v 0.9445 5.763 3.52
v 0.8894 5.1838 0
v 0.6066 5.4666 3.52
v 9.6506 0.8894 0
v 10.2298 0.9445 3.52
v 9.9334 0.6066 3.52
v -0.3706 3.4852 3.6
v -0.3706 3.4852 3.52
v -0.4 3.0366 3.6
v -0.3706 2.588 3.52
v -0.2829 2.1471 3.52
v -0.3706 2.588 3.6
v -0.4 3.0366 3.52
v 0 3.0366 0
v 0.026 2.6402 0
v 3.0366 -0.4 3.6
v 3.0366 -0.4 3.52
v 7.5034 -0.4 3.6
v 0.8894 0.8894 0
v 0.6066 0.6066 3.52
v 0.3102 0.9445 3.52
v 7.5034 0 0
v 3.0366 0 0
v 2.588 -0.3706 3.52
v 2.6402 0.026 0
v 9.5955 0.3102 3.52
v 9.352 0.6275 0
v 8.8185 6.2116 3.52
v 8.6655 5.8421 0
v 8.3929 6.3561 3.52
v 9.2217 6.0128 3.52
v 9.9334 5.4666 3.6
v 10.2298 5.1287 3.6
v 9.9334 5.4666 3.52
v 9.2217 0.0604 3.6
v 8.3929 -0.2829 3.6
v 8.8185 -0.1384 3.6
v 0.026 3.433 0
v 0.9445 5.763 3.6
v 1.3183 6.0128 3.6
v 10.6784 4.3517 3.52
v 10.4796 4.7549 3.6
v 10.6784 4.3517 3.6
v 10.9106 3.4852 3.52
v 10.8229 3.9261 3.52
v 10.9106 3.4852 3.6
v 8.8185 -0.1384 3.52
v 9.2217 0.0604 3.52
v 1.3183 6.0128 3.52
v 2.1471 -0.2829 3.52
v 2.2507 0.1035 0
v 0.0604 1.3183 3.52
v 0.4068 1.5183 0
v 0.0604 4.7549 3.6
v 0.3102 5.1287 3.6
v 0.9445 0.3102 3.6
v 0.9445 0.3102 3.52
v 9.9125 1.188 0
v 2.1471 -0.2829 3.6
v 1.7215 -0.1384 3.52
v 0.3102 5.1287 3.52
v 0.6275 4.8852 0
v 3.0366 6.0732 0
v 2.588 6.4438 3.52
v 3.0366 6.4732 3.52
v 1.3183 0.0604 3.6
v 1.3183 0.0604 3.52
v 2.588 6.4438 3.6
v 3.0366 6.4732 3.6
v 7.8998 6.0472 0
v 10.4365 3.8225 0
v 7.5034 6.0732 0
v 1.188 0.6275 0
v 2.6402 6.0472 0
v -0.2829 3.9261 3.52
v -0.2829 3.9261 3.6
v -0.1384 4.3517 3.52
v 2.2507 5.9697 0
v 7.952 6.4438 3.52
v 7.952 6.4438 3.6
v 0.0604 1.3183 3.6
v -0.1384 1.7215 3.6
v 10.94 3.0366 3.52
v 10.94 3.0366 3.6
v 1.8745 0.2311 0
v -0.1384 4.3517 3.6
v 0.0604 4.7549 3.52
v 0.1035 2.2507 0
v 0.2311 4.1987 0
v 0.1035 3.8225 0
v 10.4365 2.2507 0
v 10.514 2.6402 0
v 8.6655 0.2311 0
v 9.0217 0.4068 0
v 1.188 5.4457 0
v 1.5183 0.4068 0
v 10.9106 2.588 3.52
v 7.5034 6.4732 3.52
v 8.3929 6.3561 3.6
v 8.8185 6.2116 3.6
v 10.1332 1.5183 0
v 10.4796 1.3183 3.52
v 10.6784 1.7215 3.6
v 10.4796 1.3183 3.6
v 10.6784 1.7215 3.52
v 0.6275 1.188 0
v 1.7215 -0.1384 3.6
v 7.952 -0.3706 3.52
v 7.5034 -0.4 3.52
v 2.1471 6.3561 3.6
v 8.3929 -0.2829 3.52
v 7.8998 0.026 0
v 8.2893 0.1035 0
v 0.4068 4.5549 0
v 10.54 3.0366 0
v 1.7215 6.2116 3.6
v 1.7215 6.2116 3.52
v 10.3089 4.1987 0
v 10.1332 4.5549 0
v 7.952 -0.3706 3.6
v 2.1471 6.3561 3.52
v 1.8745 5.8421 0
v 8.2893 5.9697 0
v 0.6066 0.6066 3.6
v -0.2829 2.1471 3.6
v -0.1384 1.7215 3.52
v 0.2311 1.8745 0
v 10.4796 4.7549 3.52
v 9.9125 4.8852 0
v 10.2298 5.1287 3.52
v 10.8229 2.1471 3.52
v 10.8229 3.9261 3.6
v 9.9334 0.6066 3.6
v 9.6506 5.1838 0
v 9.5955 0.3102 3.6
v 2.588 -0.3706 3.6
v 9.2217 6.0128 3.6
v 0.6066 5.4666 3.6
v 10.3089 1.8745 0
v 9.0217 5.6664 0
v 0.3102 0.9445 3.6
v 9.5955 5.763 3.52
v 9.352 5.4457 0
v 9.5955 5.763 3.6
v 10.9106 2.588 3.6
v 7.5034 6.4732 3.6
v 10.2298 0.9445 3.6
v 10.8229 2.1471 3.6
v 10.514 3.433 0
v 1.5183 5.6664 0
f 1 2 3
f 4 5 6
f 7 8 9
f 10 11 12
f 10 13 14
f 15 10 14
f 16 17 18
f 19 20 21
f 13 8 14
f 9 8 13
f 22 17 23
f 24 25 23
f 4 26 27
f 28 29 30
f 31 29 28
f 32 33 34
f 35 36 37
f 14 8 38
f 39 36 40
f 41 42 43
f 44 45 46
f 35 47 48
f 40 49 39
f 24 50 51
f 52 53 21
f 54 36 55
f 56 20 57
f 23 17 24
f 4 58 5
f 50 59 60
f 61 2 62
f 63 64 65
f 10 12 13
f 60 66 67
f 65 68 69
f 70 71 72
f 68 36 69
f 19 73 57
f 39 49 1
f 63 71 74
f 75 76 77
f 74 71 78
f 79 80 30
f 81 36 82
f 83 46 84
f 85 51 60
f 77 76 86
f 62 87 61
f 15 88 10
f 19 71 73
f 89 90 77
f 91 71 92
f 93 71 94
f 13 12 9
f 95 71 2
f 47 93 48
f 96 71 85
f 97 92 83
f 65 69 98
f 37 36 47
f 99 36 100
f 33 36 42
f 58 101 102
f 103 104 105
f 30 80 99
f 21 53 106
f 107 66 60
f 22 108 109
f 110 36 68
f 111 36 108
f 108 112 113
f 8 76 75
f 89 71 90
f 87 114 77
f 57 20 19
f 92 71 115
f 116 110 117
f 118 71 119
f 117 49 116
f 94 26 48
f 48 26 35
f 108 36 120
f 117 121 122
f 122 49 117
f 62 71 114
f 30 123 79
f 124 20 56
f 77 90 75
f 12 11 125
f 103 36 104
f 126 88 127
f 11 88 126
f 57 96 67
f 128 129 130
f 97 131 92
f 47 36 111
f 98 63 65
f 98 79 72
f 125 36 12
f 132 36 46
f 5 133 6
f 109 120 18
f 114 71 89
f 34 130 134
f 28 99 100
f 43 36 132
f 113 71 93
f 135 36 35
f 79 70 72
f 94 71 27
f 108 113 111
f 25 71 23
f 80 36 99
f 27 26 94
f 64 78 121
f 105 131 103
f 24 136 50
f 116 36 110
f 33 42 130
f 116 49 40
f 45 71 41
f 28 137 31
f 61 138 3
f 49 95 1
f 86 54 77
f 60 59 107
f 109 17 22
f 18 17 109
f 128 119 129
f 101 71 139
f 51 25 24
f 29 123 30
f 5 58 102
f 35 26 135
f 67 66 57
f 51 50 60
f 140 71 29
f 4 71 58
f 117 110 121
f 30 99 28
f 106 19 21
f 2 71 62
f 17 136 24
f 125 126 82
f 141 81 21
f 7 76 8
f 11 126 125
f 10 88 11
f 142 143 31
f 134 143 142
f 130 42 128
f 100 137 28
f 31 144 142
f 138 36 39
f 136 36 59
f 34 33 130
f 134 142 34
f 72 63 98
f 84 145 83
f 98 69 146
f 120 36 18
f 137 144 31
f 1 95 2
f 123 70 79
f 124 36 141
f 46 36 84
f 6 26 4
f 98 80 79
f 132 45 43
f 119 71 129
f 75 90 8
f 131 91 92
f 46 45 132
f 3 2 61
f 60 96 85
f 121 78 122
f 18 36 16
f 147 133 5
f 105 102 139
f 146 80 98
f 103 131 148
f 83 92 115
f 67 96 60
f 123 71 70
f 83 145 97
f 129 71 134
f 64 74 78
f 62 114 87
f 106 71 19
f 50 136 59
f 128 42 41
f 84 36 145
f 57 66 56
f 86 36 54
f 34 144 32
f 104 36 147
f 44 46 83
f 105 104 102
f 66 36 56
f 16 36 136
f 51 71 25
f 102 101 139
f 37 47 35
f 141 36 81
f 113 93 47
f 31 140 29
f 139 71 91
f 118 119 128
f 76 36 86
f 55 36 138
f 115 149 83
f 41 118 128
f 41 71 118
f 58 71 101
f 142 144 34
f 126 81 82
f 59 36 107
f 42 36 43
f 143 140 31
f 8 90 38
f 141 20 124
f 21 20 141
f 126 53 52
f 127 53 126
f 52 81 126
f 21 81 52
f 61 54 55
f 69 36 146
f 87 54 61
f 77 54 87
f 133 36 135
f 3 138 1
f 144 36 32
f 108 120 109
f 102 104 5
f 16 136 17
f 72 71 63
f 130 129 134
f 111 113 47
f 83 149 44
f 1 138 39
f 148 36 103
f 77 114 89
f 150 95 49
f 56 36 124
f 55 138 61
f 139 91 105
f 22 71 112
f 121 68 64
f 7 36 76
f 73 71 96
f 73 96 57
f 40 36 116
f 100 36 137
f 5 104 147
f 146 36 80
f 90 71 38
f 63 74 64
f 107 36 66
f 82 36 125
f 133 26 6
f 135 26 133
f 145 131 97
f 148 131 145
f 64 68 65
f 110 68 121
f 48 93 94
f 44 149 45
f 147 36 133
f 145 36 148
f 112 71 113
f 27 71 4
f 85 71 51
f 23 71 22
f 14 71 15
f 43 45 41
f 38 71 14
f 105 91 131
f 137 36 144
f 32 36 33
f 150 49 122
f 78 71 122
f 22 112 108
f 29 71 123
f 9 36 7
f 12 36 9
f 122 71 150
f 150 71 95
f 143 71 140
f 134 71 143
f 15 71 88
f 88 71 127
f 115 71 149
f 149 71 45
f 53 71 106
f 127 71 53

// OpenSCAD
// file: dims.scad
// =============================================================================
// PLACEHOLDER dimensions — Option 1 replace-face stack
// =============================================================================
// ESTIMATED millimetres from refs/flat/DIMENSIONS.md (170 × 72.3, 2.35:1).
// Callipers are UNKNOWN. Every critical size is a guess until the OEM face
// and cluster bay are measured. This is NOT a verified AP1 drop-in.
//
// Origin (OpenSCAD): bottom-left of the module bounding box, Z toward driver.
// DIMENSIONS.md / pygame use top-left percentages — convert with y_from_top().
// =============================================================================

$fn = 48;
eps = 0.08;

// --- locked flat elevation (ESTIMATED mm from DIMENSIONS.md) ----------------
face_w = 170.0;             // ESTIMATED — TODO measure OEM face width
face_h = 72.3;              // ESTIMATED — 170 / 2.35; TODO measure height
face_aspect = 2.35;         // lock; do not invent a new family

step_w_pct = 0.044;         // rectangular side-notch depth
notch_top_pct = 0.58;       // from module top (OEM lock)
notch_bot_pct = 0.72;
arch_rise_pct = 0.28;       // y% = 28 * u² from the module top
arch_steps = 40;

lcd_inset_x_pct = 0.010;    // extra inset inside the notch
lcd_top_pct = 0.055;
lcd_bottom_pct = 0.76;      // just under TEMP / FUEL
lcd_spring_inset_pct = 0.02;
lcd_frame_mm = 1.0;         // PLACEHOLDER — keeps the mask one piece (see outline)

temp_x_pct = 0.075;
temp_y_pct = 0.72;
fuel_x_pct = 0.745;
fuel_y_pct = 0.72;
bar_w_pct = 0.180;
bar_h_pct = 0.030;

speed_x_pct = 0.50;
speed_y_pct = 0.40;

lamp_y_pct = 0.805;         // hardware-strip centre-line
bezel_h_pct = 0.175;
lamp_w_pct = 0.50;          // PLACEHOLDER — telltale pack not callipered
lamp_h_from_bezel = 0.58;

btn_pad_x_pct = 0.018;
rocker_w_pct = 0.092;
trip_w_pct = 0.062;
btn_h_from_bezel = 0.48;
sel_gap_mm = 1.0;           // PLACEHOLDER (UI uses ~10 px on a 1920 canvas)

tach_slots = 10;            // 0..9 placeholder windows
tach_slot_w = 4.2;          // PLACEHOLDER mm
tach_slot_h = 5.5;          // PLACEHOLDER mm
tach_slot_inset = 3.2;      // PLACEHOLDER — inward from outer arch

// --- stack thicknesses (ALL PLACEHOLDER / TODO measure) ---------------------
face_t = 2.0;               // PLACEHOLDER acrylic / printed mask
tray_h = 12.0;              // PLACEHOLDER overall backlight tray
floor_t = 1.6;              // PLACEHOLDER backscreen floor
diffuser_t = 1.2;           // PLACEHOLDER opal sheet (bought, not printed)
wall = 2.0;                 // PLACEHOLDER tray wall
face_pocket_clear = 0.35;   // PLACEHOLDER slip around dropped-in face
lcd_pocket_clear = 0.40;    // PLACEHOLDER
cable_w = 16.0;             // PLACEHOLDER — FPC / tail location UNKNOWN
cable_h = 4.0;              // PLACEHOLDER

align_pin_d = 2.0;          // PLACEHOLDER — holes only; no printed bosses
align_hole_d = 2.3;         // PLACEHOLDER — do not drill the bay from this
align_pin_h = 2.6;          // PLACEHOLDER — unused until a pin is measured
align_boss_d = 4.4;         // PLACEHOLDER — unused (web/tray stay separate)

button_clear = 0.40;        // PLACEHOLDER hole oversize
button_cap_t = 2.4;         // PLACEHOLDER proud cap
button_flange_t = 1.2;      // PLACEHOLDER retention flange
button_flange_extra = 1.6;  // PLACEHOLDER radial flange beyond cap
button_stem_d = 3.0;        // PLACEHOLDER — switch model UNKNOWN
button_stem_h = 5.0;        // PLACEHOLDER — travel / switch height UNKNOWN
rocker_groove_w = 0.80;
rocker_groove_d = 1.10;

stem_well_d = 6.0;          // PLACEHOLDER switch well in the tray
stem_well_h = 7.0;          // PLACEHOLDER

// --- derived (still ESTIMATED; inherit the TODOs above) ---------------------
step_w = face_w * step_w_pct;
arch_rise = face_h * arch_rise_pct;
spring_y = face_h * (1 - arch_rise_pct);
notch_top_y = face_h * (1 - notch_top_pct);
notch_bot_y = face_h * (1 - notch_bot_pct);

lcd_x = step_w + face_w * lcd_inset_x_pct;
lcd_w = face_w - 2 * step_w - 2 * face_w * lcd_inset_x_pct;
lcd_peak_y = face_h * (1 - lcd_top_pct);
lcd_bot_y = face_h * (1 - lcd_bottom_pct);
lcd_spring_y = face_h * (1 - (arch_rise_pct - lcd_spring_inset_pct));

bezel_h = face_h * bezel_h_pct;
btn_h = bezel_h * btn_h_from_bezel;
btn_y_from_top = face_h * lamp_y_pct + (bezel_h - btn_h) / 2;
btn_y = face_h - btn_y_from_top - btn_h;

rocker_x = face_w * btn_pad_x_pct;
rocker_w = face_w * rocker_w_pct;
trip_w = face_w * trip_w_pct;
trip_x = face_w - face_w * btn_pad_x_pct - trip_w;
sel_x = trip_x - trip_w - sel_gap_mm;

lamp_w = face_w * lamp_w_pct;
lamp_h = bezel_h * lamp_h_from_bezel;
lamp_x = (face_w - lamp_w) / 2;
lamp_y_from_top = face_h * lamp_y_pct - lamp_h / 2;
lamp_y = face_h - lamp_y_from_top - lamp_h;

temp_x = face_w * temp_x_pct;
temp_w = face_w * bar_w_pct;
temp_h = face_h * bar_h_pct;
temp_y = face_h * (1 - temp_y_pct - bar_h_pct);

fuel_x = face_w * fuel_x_pct;
fuel_w = temp_w;
fuel_h = temp_h;
fuel_y = temp_y;

face_rebate_z = tray_h - face_t;
diffuser_z = floor_t;

function y_from_top(pct) = face_h * (1 - pct);

function arch_xy(u, x0, x1, y_peak, y_spring) =
    let (
        t = (u + 1) / 2,
        x = x0 + (x1 - x0) * t,
        y = y_peak - (y_peak - y_spring) * u * u
    )
    [x, y];
// file: outline.scad
// =============================================================================
// 2D OEM silhouette + window helpers (replace-face)
// =============================================================================
// Matches refs/flat/DIMENSIONS.md and src/gauge_ui.py hood_outer_points():
// flat bottom, rectangular 58–72% notches, parabola y% = 28 u².
// All sizes still ESTIMATED / PLACEHOLDER — see dims.scad.
// =============================================================================

include <dims.scad>

function arch_points(x0, x1, y_peak, y_spring, n = arch_steps) =
    [for (i = [0 : n])
        let (t = i / n, u = 2 * t - 1)
        [x0 + (x1 - x0) * t, y_peak - (y_peak - y_spring) * u * u]
    ];

// Counter-clockwise from bottom-left. Notch-top is colinear with the inset
// side; kept so the point list matches the pygame lock.
function hood_points() =
    concat(
        [
            [0, 0],
            [face_w, 0],
            [face_w, notch_bot_y],
            [face_w - step_w, notch_bot_y],
            [face_w - step_w, notch_top_y],
            [face_w - step_w, spring_y]
        ],
        arch_points(face_w - step_w, step_w, face_h, spring_y),
        [
            [step_w, spring_y],
            [step_w, notch_top_y],
            [step_w, notch_bot_y],
            [0, notch_bot_y]
        ]
    );

function lcd_points() =
    concat(
        [
            [lcd_x, lcd_bot_y],
            [lcd_x + lcd_w, lcd_bot_y],
            [lcd_x + lcd_w, lcd_spring_y]
        ],
        arch_points(lcd_x + lcd_w, lcd_x, lcd_peak_y, lcd_spring_y),
        [[lcd_x, lcd_spring_y]]
    );

module hood_2d() {
    polygon(hood_points());
}

module lcd_2d() {
    polygon(lcd_points());
}

module lcd_window_2d() {
    // Keep a continuous frame — the raw LCD polygon breaches the hood
    // arch at both springs (lcd_spring sits above hood spring).
    intersection() {
        offset(delta = -lcd_frame_mm)
            hood_2d();
        lcd_2d();
    }
}

module stadium_2d(w, h) {
    r = min(w, h) / 2;
    hull() {
        translate([r, r]) circle(r = r);
        translate([w - r, r]) circle(r = r);
    }
}

module rounded_rect_2d(w, h, r) {
    rr = min(r, w / 2, h / 2);
    hull() {
        translate([rr, rr]) circle(r = rr);
        translate([w - rr, rr]) circle(r = rr);
        translate([rr, h - rr]) circle(r = rr);
        translate([w - rr, h - rr]) circle(r = rr);
    }
}

module tach_slots_2d() {
    // PLACEHOLDER windows along the outer arch (0–9). Not OEM digit geometry.
    x0 = step_w;
    x1 = face_w - step_w;
    for (i = [0 : tach_slots - 1]) {
        t = i / (tach_slots - 1);
        u = (2 * t - 1) * 0.82;     // keep slots off the inset side walls
        p = arch_xy(u, x0, x1, face_h, spring_y);
        translate([p[0] - tach_slot_w / 2, p[1] - tach_slot_h - tach_slot_inset])
            rounded_rect_2d(tach_slot_w, tach_slot_h, 0.6);
    }
}

module lamp_window_2d() {
    translate([lamp_x, lamp_y])
        rounded_rect_2d(lamp_w, lamp_h, 1.2);
}

module button_caps_2d(extra = 0) {
    translate([rocker_x - extra, btn_y - extra])
        stadium_2d(rocker_w + 2 * extra, btn_h + 2 * extra);
    translate([sel_x - extra, btn_y - extra])
        stadium_2d(trip_w + 2 * extra, btn_h + 2 * extra);
    translate([trip_x - extra, btn_y - extra])
        stadium_2d(trip_w + 2 * extra, btn_h + 2 * extra);
}

module temp_bar_2d() {
    translate([temp_x, temp_y])
        rounded_rect_2d(temp_w, temp_h, 0.4);
}

module fuel_bar_2d() {
    translate([fuel_x, fuel_y])
        rounded_rect_2d(fuel_w, fuel_h, 0.4);
}

// Four PLACEHOLDER pins in the bottom bezel (not in the LCD). Fiction until measured.
function align_xy() = [
    [rocker_x + rocker_w + 4.0, 3.2],
    [sel_x - 4.0, 3.2],
    [rocker_x + rocker_w + 4.0, lcd_bot_y - 3.0],
    [sel_x - 4.0, lcd_bot_y - 3.0]
];

module align_holes_2d(d = align_hole_d) {
    for (p = align_xy())
        translate(p) circle(d = d);
}

function stem_xy() = [
    [rocker_x + rocker_w * 0.28, btn_y + btn_h / 2],
    [rocker_x + rocker_w * 0.72, btn_y + btn_h / 2],
    [sel_x + trip_w / 2, btn_y + btn_h / 2],
    [trip_x + trip_w / 2, btn_y + btn_h / 2]
];
// file: parts.scad
// =============================================================================
// 3D printable modules — Option 1 replace-face stack
// =============================================================================
// One module = one solid. Downstream Blender remesh is expected; this file
// stays parametric. Callipers UNKNOWN. Not a verified AP1 drop-in.
//
// Cabin-facing hard parts: PETG or ASA. Do NOT use PLA in the cabin.
// Buttons: TPU 95A or cast silicone — not OEM rubber.
// =============================================================================

include <outline.scad>

module _through(h) {
    translate([0, 0, -eps])
        linear_extrude(h + 2 * eps)
            children();
}

module _cowl_web_2d() {
    // Inset so the web never shares an edge with the tray wall.
    difference() {
        offset(delta = -0.45)
            hood_2d();
        offset(delta = 0.35)
            lcd_window_2d();
        tach_slots_2d();
        offset(delta = 0.4)
            lamp_window_2d();
        button_caps_2d(1.2);
        align_holes_2d(align_hole_d + 0.8);
    }
}

module backlight() {
    // Tray shell only — one difference, no unioned ribs or pins.
    // Outer rim is offset(wall) around the 170×72.3 silhouette: a print wall,
    // NOT a measured bay clip and NOT a claimed AP1 fit.
    cavity_h = face_rebate_z - floor_t - 0.06;

    difference() {
        linear_extrude(tray_h)
            offset(delta = wall)
                hood_2d();

        translate([0, 0, face_rebate_z])
            linear_extrude(face_t + 1)
                offset(delta = face_pocket_clear)
                    hood_2d();

        translate([0, 0, floor_t])
            linear_extrude(cavity_h)
                hood_2d();

        // Switch wells — model UNKNOWN
        for (p = stem_xy())
            translate([p[0], p[1], -eps])
                cylinder(h = stem_well_h + eps, d = stem_well_d);

        // Cable / FPC escape — LOCATION UNKNOWN
        translate([
            face_w / 2 - cable_w / 2,
            -wall - eps,
            floor_t
        ])
            cube([cable_w, wall + 2 * eps, cable_h]);

        _through(tray_h)
            align_holes_2d();
    }
}

module backlight_web() {
    // Separate cowl-band insert. Drops on the tray floor. One extrusion.
    linear_extrude(min(3.8, face_rebate_z - floor_t - 0.5))
        _cowl_web_2d();
}

module acrylic_face() {
    // Mask plate — through-windows only. No back rebates (cleaner remesh).
    // Production: laser acrylic. Print proxy: PETG or ASA.
    difference() {
        linear_extrude(face_t)
            hood_2d();

        _through(face_t)
            lcd_window_2d();
        _through(face_t)
            tach_slots_2d();
        _through(face_t)
            lamp_window_2d();
        _through(face_t)
            button_caps_2d(button_clear);
        _through(face_t)
            align_holes_2d();
    }
}

module _button_solid(w, flange_extra) {
    // Single hull: cap → flange. No stem (switch UNKNOWN — add after measure).
    hull() {
        linear_extrude(eps)
            stadium_2d(w, btn_h);
        translate([0, 0, button_cap_t - eps])
            linear_extrude(eps)
                stadium_2d(w, btn_h);
        translate([
            -flange_extra,
            -flange_extra,
            button_cap_t + button_flange_t - eps
        ])
            linear_extrude(eps)
                stadium_2d(
                    w + 2 * flange_extra,
                    btn_h + 2 * flange_extra
                );
    }
}

module rocker_button() {
    difference() {
        _button_solid(rocker_w, button_flange_extra);
        translate([rocker_w / 2 - rocker_groove_w / 2, -eps, -eps])
            cube([rocker_groove_w, btn_h + 2 * eps, rocker_groove_d + eps]);
    }
}

module oval_button() {
    _button_solid(trip_w, min(button_flange_extra, sel_gap_mm * 0.4));
}

module sel_button() {
    oval_button();
}

module trip_button() {
    oval_button();
}

module rubber_buttons_print() {
    // F5 plate preview only — do not export this as one STL.
    rocker_button();
    translate([rocker_w + 8, 0, 0])
        sel_button();
    translate([rocker_w + 8 + trip_w + 8, 0, 0])
        trip_button();
}

module rubber_buttons_placed() {
    translate([0, 0, button_cap_t * 0.35])
        mirror([0, 0, 1]) {
            translate([rocker_x, btn_y, 0])
                rocker_button();
            translate([sel_x, btn_y, 0])
                sel_button();
            translate([trip_x, btn_y, 0])
                trip_button();
        }
}

module assembly(explode = 0) {
    // F5 preview only. Not a printable mesh.
    color([0.22, 0.22, 0.24])
        backlight();
    color([0.55, 0.52, 0.48])
        translate([0, 0, floor_t + explode * 0.35])
            backlight_web();
    color([0.82, 0.80, 0.74, 0.55])
        translate([0, 0, face_rebate_z + explode])
            acrylic_face();
    color([0.12, 0.12, 0.12])
        translate([0, 0, tray_h + explode * 2])
            rubber_buttons_placed();
}
// main file
// =============================================================================
// PLACEHOLDER — SEL oval (Option 1 replace-face)
// =============================================================================
// One solid. Include if the OEM face has this blank oval. Callipers UNKNOWN.
// Print in TPU 95A or cast silicone. Do NOT use PLA.
// =============================================================================

include <parts.scad>
sel_button();
